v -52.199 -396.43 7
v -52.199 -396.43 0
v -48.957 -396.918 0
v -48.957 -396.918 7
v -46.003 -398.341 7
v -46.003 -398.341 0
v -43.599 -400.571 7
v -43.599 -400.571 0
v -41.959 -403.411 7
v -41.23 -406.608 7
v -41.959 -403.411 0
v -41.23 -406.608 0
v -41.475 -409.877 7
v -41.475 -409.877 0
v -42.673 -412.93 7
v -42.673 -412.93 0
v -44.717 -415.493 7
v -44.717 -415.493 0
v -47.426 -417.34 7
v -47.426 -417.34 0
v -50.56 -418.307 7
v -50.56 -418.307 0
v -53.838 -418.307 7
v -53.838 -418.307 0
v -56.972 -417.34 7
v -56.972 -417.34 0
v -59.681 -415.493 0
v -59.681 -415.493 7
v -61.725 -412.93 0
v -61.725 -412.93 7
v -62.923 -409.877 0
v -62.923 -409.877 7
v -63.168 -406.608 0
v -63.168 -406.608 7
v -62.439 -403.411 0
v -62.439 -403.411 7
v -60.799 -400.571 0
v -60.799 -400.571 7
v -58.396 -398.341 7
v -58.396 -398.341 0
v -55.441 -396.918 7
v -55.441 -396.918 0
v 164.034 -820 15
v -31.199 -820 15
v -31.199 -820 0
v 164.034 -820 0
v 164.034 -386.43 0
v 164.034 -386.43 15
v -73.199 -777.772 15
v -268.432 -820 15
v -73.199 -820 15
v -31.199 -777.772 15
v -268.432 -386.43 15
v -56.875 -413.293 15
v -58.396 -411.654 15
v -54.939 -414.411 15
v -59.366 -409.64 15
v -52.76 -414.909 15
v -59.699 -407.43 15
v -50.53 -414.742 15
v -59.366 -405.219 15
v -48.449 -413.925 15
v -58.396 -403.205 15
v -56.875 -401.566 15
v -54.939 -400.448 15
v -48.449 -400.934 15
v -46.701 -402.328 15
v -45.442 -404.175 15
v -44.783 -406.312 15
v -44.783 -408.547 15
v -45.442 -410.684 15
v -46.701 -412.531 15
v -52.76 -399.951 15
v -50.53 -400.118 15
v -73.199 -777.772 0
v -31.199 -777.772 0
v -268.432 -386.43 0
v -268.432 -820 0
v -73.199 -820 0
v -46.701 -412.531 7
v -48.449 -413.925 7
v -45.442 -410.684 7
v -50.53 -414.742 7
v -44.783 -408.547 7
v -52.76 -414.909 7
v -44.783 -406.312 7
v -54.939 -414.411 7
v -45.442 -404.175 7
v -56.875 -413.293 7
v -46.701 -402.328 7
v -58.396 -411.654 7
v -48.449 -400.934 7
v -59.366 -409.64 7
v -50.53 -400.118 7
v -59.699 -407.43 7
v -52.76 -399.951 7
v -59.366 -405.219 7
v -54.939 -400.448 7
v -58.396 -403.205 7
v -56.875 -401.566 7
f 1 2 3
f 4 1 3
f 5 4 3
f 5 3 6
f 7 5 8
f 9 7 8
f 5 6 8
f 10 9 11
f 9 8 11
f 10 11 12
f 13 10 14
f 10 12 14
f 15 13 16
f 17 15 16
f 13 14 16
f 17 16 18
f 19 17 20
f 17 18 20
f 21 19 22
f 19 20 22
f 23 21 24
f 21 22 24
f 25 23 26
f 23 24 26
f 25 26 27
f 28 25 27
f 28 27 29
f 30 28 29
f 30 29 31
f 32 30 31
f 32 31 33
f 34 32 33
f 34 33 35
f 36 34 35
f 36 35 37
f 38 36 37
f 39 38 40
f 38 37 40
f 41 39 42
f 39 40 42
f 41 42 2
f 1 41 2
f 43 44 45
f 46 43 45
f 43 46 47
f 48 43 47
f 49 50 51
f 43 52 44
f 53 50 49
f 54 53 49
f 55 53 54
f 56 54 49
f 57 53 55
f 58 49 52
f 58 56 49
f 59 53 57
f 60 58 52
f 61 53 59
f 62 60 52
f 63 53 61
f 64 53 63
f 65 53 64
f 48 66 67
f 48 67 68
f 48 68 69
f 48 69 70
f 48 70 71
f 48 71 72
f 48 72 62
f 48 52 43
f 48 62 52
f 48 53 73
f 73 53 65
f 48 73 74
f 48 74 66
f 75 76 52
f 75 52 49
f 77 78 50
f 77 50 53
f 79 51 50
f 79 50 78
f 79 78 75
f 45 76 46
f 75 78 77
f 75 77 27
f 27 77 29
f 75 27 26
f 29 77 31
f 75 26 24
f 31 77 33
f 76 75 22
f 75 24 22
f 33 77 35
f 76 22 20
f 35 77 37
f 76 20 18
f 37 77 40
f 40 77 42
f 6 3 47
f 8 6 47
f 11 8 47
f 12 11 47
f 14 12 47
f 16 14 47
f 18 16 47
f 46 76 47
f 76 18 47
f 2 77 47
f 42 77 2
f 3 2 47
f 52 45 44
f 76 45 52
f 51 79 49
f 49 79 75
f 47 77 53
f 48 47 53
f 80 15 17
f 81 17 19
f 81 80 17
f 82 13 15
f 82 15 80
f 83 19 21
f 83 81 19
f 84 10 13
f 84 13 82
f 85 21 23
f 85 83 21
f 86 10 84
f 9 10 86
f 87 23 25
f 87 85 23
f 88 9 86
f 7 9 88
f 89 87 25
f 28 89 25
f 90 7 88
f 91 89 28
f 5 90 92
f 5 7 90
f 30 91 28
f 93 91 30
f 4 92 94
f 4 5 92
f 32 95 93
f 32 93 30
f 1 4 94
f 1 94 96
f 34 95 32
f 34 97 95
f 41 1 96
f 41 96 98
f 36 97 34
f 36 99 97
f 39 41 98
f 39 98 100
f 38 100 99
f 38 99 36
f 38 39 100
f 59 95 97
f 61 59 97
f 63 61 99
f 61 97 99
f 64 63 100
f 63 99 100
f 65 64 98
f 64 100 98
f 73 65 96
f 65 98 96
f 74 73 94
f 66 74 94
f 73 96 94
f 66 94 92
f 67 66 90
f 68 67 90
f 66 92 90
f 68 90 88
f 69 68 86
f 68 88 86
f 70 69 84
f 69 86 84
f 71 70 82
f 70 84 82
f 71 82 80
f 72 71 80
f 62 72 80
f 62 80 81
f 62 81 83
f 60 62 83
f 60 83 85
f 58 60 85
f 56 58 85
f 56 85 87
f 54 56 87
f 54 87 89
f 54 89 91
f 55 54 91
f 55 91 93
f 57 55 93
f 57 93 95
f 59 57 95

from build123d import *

# Parameters (mm, degrees)
ESQUISSE1_W             = 432.465319529
ESQUISSE1_H             = 1000
BOSS_EXTRU_1_DEPTH      = 15
ESQUISSE2_W             = 15
ESQUISSE2_H             = 180
ENL_V_MAT_EXTRU_1_DEPTH = 1090.610596771
ESQUISSE3_W             = 15
ESQUISSE3_H             = 386.42955672
ENL_V_MAT_EXTRU_2_DEPTH = 928.173798484
ESQUISSE4_W             = 42
ESQUISSE4_H             = 42.455270474
ENL_V_MAT_EXTRU_3_DEPTH = 863.948765929
ENL_V_MAT_EXTRU_4_DEPTH = 7
ESQUISSE6_R             = 7.5
ENL_V_MAT_EXTRU_5_DEPTH = 863.85547609


with BuildPart() as part:
    # Esquisse1 → Boss.-Extru.1 (new body)
    with BuildSketch(Plane.XY):
        with Locations((-52.199031023, -500)):
            Rectangle(ESQUISSE1_W, ESQUISSE1_H)
    extrude(amount=BOSS_EXTRU_1_DEPTH)

    # Esquisse2 → Enlèv. mat.-Extru.1 (cut, through all)
    with BuildSketch(Plane(origin=(164.033628742, 0, 0), x_dir=(0, 0, -1), z_dir=(1, 0, 0))):
        with Locations((-7.5, -910)):
            Rectangle(ESQUISSE2_W, ESQUISSE2_H)
    extrude(amount=-ENL_V_MAT_EXTRU_1_DEPTH, mode=Mode.SUBTRACT)

    # Esquisse3 → Enlèv. mat.-Extru.2 (cut, through all)
    with BuildSketch(Plane.ZY.offset(268.431690787)):
        with Locations((7.5, -193.21477836)):
            Rectangle(ESQUISSE3_W, ESQUISSE3_H)
    extrude(amount=-ENL_V_MAT_EXTRU_2_DEPTH, mode=Mode.SUBTRACT)

    # Esquisse4 → Enlèv. mat.-Extru.3 (cut, through all)
    with BuildSketch(Plane(origin=(0, 0, 0), x_dir=(-1, 0, 0), z_dir=(0, 0, -1))):
        with Locations((52.199031023, -799)):
            Rectangle(ESQUISSE4_W, ESQUISSE4_H)
    extrude(amount=-ENL_V_MAT_EXTRU_3_DEPTH, mode=Mode.SUBTRACT)

    # Esquisse5 → Enlèv. mat.-Extru.4 (cut)
    with BuildSketch(Plane(origin=(0, 0, 0), x_dir=(-1, 0, 0), z_dir=(0, 0, -1))):
        with BuildLine():
            ThreePointArc((52.199031023, -418.42955672), (63.199031023, -407.42955672), (52.199031023, -396.42955672))
            ThreePointArc((52.199031023, -396.42955672), (41.199031023, -407.42955672), (52.199031023, -418.42955672))
        make_face()
    extrude(amount=-ENL_V_MAT_EXTRU_4_DEPTH, mode=Mode.SUBTRACT)

    # Esquisse6 → Enlèv. mat.-Extru.5 (cut, through all)
    with BuildSketch(Plane(origin=(0, 0, 7), x_dir=(-1, 0, 0), z_dir=(0, 0, -1))):
        with Locations((52.199031023, -407.42955672)):
            Circle(ESQUISSE6_R)
    extrude(amount=-ENL_V_MAT_EXTRU_5_DEPTH, mode=Mode.SUBTRACT)


solid = part.part
